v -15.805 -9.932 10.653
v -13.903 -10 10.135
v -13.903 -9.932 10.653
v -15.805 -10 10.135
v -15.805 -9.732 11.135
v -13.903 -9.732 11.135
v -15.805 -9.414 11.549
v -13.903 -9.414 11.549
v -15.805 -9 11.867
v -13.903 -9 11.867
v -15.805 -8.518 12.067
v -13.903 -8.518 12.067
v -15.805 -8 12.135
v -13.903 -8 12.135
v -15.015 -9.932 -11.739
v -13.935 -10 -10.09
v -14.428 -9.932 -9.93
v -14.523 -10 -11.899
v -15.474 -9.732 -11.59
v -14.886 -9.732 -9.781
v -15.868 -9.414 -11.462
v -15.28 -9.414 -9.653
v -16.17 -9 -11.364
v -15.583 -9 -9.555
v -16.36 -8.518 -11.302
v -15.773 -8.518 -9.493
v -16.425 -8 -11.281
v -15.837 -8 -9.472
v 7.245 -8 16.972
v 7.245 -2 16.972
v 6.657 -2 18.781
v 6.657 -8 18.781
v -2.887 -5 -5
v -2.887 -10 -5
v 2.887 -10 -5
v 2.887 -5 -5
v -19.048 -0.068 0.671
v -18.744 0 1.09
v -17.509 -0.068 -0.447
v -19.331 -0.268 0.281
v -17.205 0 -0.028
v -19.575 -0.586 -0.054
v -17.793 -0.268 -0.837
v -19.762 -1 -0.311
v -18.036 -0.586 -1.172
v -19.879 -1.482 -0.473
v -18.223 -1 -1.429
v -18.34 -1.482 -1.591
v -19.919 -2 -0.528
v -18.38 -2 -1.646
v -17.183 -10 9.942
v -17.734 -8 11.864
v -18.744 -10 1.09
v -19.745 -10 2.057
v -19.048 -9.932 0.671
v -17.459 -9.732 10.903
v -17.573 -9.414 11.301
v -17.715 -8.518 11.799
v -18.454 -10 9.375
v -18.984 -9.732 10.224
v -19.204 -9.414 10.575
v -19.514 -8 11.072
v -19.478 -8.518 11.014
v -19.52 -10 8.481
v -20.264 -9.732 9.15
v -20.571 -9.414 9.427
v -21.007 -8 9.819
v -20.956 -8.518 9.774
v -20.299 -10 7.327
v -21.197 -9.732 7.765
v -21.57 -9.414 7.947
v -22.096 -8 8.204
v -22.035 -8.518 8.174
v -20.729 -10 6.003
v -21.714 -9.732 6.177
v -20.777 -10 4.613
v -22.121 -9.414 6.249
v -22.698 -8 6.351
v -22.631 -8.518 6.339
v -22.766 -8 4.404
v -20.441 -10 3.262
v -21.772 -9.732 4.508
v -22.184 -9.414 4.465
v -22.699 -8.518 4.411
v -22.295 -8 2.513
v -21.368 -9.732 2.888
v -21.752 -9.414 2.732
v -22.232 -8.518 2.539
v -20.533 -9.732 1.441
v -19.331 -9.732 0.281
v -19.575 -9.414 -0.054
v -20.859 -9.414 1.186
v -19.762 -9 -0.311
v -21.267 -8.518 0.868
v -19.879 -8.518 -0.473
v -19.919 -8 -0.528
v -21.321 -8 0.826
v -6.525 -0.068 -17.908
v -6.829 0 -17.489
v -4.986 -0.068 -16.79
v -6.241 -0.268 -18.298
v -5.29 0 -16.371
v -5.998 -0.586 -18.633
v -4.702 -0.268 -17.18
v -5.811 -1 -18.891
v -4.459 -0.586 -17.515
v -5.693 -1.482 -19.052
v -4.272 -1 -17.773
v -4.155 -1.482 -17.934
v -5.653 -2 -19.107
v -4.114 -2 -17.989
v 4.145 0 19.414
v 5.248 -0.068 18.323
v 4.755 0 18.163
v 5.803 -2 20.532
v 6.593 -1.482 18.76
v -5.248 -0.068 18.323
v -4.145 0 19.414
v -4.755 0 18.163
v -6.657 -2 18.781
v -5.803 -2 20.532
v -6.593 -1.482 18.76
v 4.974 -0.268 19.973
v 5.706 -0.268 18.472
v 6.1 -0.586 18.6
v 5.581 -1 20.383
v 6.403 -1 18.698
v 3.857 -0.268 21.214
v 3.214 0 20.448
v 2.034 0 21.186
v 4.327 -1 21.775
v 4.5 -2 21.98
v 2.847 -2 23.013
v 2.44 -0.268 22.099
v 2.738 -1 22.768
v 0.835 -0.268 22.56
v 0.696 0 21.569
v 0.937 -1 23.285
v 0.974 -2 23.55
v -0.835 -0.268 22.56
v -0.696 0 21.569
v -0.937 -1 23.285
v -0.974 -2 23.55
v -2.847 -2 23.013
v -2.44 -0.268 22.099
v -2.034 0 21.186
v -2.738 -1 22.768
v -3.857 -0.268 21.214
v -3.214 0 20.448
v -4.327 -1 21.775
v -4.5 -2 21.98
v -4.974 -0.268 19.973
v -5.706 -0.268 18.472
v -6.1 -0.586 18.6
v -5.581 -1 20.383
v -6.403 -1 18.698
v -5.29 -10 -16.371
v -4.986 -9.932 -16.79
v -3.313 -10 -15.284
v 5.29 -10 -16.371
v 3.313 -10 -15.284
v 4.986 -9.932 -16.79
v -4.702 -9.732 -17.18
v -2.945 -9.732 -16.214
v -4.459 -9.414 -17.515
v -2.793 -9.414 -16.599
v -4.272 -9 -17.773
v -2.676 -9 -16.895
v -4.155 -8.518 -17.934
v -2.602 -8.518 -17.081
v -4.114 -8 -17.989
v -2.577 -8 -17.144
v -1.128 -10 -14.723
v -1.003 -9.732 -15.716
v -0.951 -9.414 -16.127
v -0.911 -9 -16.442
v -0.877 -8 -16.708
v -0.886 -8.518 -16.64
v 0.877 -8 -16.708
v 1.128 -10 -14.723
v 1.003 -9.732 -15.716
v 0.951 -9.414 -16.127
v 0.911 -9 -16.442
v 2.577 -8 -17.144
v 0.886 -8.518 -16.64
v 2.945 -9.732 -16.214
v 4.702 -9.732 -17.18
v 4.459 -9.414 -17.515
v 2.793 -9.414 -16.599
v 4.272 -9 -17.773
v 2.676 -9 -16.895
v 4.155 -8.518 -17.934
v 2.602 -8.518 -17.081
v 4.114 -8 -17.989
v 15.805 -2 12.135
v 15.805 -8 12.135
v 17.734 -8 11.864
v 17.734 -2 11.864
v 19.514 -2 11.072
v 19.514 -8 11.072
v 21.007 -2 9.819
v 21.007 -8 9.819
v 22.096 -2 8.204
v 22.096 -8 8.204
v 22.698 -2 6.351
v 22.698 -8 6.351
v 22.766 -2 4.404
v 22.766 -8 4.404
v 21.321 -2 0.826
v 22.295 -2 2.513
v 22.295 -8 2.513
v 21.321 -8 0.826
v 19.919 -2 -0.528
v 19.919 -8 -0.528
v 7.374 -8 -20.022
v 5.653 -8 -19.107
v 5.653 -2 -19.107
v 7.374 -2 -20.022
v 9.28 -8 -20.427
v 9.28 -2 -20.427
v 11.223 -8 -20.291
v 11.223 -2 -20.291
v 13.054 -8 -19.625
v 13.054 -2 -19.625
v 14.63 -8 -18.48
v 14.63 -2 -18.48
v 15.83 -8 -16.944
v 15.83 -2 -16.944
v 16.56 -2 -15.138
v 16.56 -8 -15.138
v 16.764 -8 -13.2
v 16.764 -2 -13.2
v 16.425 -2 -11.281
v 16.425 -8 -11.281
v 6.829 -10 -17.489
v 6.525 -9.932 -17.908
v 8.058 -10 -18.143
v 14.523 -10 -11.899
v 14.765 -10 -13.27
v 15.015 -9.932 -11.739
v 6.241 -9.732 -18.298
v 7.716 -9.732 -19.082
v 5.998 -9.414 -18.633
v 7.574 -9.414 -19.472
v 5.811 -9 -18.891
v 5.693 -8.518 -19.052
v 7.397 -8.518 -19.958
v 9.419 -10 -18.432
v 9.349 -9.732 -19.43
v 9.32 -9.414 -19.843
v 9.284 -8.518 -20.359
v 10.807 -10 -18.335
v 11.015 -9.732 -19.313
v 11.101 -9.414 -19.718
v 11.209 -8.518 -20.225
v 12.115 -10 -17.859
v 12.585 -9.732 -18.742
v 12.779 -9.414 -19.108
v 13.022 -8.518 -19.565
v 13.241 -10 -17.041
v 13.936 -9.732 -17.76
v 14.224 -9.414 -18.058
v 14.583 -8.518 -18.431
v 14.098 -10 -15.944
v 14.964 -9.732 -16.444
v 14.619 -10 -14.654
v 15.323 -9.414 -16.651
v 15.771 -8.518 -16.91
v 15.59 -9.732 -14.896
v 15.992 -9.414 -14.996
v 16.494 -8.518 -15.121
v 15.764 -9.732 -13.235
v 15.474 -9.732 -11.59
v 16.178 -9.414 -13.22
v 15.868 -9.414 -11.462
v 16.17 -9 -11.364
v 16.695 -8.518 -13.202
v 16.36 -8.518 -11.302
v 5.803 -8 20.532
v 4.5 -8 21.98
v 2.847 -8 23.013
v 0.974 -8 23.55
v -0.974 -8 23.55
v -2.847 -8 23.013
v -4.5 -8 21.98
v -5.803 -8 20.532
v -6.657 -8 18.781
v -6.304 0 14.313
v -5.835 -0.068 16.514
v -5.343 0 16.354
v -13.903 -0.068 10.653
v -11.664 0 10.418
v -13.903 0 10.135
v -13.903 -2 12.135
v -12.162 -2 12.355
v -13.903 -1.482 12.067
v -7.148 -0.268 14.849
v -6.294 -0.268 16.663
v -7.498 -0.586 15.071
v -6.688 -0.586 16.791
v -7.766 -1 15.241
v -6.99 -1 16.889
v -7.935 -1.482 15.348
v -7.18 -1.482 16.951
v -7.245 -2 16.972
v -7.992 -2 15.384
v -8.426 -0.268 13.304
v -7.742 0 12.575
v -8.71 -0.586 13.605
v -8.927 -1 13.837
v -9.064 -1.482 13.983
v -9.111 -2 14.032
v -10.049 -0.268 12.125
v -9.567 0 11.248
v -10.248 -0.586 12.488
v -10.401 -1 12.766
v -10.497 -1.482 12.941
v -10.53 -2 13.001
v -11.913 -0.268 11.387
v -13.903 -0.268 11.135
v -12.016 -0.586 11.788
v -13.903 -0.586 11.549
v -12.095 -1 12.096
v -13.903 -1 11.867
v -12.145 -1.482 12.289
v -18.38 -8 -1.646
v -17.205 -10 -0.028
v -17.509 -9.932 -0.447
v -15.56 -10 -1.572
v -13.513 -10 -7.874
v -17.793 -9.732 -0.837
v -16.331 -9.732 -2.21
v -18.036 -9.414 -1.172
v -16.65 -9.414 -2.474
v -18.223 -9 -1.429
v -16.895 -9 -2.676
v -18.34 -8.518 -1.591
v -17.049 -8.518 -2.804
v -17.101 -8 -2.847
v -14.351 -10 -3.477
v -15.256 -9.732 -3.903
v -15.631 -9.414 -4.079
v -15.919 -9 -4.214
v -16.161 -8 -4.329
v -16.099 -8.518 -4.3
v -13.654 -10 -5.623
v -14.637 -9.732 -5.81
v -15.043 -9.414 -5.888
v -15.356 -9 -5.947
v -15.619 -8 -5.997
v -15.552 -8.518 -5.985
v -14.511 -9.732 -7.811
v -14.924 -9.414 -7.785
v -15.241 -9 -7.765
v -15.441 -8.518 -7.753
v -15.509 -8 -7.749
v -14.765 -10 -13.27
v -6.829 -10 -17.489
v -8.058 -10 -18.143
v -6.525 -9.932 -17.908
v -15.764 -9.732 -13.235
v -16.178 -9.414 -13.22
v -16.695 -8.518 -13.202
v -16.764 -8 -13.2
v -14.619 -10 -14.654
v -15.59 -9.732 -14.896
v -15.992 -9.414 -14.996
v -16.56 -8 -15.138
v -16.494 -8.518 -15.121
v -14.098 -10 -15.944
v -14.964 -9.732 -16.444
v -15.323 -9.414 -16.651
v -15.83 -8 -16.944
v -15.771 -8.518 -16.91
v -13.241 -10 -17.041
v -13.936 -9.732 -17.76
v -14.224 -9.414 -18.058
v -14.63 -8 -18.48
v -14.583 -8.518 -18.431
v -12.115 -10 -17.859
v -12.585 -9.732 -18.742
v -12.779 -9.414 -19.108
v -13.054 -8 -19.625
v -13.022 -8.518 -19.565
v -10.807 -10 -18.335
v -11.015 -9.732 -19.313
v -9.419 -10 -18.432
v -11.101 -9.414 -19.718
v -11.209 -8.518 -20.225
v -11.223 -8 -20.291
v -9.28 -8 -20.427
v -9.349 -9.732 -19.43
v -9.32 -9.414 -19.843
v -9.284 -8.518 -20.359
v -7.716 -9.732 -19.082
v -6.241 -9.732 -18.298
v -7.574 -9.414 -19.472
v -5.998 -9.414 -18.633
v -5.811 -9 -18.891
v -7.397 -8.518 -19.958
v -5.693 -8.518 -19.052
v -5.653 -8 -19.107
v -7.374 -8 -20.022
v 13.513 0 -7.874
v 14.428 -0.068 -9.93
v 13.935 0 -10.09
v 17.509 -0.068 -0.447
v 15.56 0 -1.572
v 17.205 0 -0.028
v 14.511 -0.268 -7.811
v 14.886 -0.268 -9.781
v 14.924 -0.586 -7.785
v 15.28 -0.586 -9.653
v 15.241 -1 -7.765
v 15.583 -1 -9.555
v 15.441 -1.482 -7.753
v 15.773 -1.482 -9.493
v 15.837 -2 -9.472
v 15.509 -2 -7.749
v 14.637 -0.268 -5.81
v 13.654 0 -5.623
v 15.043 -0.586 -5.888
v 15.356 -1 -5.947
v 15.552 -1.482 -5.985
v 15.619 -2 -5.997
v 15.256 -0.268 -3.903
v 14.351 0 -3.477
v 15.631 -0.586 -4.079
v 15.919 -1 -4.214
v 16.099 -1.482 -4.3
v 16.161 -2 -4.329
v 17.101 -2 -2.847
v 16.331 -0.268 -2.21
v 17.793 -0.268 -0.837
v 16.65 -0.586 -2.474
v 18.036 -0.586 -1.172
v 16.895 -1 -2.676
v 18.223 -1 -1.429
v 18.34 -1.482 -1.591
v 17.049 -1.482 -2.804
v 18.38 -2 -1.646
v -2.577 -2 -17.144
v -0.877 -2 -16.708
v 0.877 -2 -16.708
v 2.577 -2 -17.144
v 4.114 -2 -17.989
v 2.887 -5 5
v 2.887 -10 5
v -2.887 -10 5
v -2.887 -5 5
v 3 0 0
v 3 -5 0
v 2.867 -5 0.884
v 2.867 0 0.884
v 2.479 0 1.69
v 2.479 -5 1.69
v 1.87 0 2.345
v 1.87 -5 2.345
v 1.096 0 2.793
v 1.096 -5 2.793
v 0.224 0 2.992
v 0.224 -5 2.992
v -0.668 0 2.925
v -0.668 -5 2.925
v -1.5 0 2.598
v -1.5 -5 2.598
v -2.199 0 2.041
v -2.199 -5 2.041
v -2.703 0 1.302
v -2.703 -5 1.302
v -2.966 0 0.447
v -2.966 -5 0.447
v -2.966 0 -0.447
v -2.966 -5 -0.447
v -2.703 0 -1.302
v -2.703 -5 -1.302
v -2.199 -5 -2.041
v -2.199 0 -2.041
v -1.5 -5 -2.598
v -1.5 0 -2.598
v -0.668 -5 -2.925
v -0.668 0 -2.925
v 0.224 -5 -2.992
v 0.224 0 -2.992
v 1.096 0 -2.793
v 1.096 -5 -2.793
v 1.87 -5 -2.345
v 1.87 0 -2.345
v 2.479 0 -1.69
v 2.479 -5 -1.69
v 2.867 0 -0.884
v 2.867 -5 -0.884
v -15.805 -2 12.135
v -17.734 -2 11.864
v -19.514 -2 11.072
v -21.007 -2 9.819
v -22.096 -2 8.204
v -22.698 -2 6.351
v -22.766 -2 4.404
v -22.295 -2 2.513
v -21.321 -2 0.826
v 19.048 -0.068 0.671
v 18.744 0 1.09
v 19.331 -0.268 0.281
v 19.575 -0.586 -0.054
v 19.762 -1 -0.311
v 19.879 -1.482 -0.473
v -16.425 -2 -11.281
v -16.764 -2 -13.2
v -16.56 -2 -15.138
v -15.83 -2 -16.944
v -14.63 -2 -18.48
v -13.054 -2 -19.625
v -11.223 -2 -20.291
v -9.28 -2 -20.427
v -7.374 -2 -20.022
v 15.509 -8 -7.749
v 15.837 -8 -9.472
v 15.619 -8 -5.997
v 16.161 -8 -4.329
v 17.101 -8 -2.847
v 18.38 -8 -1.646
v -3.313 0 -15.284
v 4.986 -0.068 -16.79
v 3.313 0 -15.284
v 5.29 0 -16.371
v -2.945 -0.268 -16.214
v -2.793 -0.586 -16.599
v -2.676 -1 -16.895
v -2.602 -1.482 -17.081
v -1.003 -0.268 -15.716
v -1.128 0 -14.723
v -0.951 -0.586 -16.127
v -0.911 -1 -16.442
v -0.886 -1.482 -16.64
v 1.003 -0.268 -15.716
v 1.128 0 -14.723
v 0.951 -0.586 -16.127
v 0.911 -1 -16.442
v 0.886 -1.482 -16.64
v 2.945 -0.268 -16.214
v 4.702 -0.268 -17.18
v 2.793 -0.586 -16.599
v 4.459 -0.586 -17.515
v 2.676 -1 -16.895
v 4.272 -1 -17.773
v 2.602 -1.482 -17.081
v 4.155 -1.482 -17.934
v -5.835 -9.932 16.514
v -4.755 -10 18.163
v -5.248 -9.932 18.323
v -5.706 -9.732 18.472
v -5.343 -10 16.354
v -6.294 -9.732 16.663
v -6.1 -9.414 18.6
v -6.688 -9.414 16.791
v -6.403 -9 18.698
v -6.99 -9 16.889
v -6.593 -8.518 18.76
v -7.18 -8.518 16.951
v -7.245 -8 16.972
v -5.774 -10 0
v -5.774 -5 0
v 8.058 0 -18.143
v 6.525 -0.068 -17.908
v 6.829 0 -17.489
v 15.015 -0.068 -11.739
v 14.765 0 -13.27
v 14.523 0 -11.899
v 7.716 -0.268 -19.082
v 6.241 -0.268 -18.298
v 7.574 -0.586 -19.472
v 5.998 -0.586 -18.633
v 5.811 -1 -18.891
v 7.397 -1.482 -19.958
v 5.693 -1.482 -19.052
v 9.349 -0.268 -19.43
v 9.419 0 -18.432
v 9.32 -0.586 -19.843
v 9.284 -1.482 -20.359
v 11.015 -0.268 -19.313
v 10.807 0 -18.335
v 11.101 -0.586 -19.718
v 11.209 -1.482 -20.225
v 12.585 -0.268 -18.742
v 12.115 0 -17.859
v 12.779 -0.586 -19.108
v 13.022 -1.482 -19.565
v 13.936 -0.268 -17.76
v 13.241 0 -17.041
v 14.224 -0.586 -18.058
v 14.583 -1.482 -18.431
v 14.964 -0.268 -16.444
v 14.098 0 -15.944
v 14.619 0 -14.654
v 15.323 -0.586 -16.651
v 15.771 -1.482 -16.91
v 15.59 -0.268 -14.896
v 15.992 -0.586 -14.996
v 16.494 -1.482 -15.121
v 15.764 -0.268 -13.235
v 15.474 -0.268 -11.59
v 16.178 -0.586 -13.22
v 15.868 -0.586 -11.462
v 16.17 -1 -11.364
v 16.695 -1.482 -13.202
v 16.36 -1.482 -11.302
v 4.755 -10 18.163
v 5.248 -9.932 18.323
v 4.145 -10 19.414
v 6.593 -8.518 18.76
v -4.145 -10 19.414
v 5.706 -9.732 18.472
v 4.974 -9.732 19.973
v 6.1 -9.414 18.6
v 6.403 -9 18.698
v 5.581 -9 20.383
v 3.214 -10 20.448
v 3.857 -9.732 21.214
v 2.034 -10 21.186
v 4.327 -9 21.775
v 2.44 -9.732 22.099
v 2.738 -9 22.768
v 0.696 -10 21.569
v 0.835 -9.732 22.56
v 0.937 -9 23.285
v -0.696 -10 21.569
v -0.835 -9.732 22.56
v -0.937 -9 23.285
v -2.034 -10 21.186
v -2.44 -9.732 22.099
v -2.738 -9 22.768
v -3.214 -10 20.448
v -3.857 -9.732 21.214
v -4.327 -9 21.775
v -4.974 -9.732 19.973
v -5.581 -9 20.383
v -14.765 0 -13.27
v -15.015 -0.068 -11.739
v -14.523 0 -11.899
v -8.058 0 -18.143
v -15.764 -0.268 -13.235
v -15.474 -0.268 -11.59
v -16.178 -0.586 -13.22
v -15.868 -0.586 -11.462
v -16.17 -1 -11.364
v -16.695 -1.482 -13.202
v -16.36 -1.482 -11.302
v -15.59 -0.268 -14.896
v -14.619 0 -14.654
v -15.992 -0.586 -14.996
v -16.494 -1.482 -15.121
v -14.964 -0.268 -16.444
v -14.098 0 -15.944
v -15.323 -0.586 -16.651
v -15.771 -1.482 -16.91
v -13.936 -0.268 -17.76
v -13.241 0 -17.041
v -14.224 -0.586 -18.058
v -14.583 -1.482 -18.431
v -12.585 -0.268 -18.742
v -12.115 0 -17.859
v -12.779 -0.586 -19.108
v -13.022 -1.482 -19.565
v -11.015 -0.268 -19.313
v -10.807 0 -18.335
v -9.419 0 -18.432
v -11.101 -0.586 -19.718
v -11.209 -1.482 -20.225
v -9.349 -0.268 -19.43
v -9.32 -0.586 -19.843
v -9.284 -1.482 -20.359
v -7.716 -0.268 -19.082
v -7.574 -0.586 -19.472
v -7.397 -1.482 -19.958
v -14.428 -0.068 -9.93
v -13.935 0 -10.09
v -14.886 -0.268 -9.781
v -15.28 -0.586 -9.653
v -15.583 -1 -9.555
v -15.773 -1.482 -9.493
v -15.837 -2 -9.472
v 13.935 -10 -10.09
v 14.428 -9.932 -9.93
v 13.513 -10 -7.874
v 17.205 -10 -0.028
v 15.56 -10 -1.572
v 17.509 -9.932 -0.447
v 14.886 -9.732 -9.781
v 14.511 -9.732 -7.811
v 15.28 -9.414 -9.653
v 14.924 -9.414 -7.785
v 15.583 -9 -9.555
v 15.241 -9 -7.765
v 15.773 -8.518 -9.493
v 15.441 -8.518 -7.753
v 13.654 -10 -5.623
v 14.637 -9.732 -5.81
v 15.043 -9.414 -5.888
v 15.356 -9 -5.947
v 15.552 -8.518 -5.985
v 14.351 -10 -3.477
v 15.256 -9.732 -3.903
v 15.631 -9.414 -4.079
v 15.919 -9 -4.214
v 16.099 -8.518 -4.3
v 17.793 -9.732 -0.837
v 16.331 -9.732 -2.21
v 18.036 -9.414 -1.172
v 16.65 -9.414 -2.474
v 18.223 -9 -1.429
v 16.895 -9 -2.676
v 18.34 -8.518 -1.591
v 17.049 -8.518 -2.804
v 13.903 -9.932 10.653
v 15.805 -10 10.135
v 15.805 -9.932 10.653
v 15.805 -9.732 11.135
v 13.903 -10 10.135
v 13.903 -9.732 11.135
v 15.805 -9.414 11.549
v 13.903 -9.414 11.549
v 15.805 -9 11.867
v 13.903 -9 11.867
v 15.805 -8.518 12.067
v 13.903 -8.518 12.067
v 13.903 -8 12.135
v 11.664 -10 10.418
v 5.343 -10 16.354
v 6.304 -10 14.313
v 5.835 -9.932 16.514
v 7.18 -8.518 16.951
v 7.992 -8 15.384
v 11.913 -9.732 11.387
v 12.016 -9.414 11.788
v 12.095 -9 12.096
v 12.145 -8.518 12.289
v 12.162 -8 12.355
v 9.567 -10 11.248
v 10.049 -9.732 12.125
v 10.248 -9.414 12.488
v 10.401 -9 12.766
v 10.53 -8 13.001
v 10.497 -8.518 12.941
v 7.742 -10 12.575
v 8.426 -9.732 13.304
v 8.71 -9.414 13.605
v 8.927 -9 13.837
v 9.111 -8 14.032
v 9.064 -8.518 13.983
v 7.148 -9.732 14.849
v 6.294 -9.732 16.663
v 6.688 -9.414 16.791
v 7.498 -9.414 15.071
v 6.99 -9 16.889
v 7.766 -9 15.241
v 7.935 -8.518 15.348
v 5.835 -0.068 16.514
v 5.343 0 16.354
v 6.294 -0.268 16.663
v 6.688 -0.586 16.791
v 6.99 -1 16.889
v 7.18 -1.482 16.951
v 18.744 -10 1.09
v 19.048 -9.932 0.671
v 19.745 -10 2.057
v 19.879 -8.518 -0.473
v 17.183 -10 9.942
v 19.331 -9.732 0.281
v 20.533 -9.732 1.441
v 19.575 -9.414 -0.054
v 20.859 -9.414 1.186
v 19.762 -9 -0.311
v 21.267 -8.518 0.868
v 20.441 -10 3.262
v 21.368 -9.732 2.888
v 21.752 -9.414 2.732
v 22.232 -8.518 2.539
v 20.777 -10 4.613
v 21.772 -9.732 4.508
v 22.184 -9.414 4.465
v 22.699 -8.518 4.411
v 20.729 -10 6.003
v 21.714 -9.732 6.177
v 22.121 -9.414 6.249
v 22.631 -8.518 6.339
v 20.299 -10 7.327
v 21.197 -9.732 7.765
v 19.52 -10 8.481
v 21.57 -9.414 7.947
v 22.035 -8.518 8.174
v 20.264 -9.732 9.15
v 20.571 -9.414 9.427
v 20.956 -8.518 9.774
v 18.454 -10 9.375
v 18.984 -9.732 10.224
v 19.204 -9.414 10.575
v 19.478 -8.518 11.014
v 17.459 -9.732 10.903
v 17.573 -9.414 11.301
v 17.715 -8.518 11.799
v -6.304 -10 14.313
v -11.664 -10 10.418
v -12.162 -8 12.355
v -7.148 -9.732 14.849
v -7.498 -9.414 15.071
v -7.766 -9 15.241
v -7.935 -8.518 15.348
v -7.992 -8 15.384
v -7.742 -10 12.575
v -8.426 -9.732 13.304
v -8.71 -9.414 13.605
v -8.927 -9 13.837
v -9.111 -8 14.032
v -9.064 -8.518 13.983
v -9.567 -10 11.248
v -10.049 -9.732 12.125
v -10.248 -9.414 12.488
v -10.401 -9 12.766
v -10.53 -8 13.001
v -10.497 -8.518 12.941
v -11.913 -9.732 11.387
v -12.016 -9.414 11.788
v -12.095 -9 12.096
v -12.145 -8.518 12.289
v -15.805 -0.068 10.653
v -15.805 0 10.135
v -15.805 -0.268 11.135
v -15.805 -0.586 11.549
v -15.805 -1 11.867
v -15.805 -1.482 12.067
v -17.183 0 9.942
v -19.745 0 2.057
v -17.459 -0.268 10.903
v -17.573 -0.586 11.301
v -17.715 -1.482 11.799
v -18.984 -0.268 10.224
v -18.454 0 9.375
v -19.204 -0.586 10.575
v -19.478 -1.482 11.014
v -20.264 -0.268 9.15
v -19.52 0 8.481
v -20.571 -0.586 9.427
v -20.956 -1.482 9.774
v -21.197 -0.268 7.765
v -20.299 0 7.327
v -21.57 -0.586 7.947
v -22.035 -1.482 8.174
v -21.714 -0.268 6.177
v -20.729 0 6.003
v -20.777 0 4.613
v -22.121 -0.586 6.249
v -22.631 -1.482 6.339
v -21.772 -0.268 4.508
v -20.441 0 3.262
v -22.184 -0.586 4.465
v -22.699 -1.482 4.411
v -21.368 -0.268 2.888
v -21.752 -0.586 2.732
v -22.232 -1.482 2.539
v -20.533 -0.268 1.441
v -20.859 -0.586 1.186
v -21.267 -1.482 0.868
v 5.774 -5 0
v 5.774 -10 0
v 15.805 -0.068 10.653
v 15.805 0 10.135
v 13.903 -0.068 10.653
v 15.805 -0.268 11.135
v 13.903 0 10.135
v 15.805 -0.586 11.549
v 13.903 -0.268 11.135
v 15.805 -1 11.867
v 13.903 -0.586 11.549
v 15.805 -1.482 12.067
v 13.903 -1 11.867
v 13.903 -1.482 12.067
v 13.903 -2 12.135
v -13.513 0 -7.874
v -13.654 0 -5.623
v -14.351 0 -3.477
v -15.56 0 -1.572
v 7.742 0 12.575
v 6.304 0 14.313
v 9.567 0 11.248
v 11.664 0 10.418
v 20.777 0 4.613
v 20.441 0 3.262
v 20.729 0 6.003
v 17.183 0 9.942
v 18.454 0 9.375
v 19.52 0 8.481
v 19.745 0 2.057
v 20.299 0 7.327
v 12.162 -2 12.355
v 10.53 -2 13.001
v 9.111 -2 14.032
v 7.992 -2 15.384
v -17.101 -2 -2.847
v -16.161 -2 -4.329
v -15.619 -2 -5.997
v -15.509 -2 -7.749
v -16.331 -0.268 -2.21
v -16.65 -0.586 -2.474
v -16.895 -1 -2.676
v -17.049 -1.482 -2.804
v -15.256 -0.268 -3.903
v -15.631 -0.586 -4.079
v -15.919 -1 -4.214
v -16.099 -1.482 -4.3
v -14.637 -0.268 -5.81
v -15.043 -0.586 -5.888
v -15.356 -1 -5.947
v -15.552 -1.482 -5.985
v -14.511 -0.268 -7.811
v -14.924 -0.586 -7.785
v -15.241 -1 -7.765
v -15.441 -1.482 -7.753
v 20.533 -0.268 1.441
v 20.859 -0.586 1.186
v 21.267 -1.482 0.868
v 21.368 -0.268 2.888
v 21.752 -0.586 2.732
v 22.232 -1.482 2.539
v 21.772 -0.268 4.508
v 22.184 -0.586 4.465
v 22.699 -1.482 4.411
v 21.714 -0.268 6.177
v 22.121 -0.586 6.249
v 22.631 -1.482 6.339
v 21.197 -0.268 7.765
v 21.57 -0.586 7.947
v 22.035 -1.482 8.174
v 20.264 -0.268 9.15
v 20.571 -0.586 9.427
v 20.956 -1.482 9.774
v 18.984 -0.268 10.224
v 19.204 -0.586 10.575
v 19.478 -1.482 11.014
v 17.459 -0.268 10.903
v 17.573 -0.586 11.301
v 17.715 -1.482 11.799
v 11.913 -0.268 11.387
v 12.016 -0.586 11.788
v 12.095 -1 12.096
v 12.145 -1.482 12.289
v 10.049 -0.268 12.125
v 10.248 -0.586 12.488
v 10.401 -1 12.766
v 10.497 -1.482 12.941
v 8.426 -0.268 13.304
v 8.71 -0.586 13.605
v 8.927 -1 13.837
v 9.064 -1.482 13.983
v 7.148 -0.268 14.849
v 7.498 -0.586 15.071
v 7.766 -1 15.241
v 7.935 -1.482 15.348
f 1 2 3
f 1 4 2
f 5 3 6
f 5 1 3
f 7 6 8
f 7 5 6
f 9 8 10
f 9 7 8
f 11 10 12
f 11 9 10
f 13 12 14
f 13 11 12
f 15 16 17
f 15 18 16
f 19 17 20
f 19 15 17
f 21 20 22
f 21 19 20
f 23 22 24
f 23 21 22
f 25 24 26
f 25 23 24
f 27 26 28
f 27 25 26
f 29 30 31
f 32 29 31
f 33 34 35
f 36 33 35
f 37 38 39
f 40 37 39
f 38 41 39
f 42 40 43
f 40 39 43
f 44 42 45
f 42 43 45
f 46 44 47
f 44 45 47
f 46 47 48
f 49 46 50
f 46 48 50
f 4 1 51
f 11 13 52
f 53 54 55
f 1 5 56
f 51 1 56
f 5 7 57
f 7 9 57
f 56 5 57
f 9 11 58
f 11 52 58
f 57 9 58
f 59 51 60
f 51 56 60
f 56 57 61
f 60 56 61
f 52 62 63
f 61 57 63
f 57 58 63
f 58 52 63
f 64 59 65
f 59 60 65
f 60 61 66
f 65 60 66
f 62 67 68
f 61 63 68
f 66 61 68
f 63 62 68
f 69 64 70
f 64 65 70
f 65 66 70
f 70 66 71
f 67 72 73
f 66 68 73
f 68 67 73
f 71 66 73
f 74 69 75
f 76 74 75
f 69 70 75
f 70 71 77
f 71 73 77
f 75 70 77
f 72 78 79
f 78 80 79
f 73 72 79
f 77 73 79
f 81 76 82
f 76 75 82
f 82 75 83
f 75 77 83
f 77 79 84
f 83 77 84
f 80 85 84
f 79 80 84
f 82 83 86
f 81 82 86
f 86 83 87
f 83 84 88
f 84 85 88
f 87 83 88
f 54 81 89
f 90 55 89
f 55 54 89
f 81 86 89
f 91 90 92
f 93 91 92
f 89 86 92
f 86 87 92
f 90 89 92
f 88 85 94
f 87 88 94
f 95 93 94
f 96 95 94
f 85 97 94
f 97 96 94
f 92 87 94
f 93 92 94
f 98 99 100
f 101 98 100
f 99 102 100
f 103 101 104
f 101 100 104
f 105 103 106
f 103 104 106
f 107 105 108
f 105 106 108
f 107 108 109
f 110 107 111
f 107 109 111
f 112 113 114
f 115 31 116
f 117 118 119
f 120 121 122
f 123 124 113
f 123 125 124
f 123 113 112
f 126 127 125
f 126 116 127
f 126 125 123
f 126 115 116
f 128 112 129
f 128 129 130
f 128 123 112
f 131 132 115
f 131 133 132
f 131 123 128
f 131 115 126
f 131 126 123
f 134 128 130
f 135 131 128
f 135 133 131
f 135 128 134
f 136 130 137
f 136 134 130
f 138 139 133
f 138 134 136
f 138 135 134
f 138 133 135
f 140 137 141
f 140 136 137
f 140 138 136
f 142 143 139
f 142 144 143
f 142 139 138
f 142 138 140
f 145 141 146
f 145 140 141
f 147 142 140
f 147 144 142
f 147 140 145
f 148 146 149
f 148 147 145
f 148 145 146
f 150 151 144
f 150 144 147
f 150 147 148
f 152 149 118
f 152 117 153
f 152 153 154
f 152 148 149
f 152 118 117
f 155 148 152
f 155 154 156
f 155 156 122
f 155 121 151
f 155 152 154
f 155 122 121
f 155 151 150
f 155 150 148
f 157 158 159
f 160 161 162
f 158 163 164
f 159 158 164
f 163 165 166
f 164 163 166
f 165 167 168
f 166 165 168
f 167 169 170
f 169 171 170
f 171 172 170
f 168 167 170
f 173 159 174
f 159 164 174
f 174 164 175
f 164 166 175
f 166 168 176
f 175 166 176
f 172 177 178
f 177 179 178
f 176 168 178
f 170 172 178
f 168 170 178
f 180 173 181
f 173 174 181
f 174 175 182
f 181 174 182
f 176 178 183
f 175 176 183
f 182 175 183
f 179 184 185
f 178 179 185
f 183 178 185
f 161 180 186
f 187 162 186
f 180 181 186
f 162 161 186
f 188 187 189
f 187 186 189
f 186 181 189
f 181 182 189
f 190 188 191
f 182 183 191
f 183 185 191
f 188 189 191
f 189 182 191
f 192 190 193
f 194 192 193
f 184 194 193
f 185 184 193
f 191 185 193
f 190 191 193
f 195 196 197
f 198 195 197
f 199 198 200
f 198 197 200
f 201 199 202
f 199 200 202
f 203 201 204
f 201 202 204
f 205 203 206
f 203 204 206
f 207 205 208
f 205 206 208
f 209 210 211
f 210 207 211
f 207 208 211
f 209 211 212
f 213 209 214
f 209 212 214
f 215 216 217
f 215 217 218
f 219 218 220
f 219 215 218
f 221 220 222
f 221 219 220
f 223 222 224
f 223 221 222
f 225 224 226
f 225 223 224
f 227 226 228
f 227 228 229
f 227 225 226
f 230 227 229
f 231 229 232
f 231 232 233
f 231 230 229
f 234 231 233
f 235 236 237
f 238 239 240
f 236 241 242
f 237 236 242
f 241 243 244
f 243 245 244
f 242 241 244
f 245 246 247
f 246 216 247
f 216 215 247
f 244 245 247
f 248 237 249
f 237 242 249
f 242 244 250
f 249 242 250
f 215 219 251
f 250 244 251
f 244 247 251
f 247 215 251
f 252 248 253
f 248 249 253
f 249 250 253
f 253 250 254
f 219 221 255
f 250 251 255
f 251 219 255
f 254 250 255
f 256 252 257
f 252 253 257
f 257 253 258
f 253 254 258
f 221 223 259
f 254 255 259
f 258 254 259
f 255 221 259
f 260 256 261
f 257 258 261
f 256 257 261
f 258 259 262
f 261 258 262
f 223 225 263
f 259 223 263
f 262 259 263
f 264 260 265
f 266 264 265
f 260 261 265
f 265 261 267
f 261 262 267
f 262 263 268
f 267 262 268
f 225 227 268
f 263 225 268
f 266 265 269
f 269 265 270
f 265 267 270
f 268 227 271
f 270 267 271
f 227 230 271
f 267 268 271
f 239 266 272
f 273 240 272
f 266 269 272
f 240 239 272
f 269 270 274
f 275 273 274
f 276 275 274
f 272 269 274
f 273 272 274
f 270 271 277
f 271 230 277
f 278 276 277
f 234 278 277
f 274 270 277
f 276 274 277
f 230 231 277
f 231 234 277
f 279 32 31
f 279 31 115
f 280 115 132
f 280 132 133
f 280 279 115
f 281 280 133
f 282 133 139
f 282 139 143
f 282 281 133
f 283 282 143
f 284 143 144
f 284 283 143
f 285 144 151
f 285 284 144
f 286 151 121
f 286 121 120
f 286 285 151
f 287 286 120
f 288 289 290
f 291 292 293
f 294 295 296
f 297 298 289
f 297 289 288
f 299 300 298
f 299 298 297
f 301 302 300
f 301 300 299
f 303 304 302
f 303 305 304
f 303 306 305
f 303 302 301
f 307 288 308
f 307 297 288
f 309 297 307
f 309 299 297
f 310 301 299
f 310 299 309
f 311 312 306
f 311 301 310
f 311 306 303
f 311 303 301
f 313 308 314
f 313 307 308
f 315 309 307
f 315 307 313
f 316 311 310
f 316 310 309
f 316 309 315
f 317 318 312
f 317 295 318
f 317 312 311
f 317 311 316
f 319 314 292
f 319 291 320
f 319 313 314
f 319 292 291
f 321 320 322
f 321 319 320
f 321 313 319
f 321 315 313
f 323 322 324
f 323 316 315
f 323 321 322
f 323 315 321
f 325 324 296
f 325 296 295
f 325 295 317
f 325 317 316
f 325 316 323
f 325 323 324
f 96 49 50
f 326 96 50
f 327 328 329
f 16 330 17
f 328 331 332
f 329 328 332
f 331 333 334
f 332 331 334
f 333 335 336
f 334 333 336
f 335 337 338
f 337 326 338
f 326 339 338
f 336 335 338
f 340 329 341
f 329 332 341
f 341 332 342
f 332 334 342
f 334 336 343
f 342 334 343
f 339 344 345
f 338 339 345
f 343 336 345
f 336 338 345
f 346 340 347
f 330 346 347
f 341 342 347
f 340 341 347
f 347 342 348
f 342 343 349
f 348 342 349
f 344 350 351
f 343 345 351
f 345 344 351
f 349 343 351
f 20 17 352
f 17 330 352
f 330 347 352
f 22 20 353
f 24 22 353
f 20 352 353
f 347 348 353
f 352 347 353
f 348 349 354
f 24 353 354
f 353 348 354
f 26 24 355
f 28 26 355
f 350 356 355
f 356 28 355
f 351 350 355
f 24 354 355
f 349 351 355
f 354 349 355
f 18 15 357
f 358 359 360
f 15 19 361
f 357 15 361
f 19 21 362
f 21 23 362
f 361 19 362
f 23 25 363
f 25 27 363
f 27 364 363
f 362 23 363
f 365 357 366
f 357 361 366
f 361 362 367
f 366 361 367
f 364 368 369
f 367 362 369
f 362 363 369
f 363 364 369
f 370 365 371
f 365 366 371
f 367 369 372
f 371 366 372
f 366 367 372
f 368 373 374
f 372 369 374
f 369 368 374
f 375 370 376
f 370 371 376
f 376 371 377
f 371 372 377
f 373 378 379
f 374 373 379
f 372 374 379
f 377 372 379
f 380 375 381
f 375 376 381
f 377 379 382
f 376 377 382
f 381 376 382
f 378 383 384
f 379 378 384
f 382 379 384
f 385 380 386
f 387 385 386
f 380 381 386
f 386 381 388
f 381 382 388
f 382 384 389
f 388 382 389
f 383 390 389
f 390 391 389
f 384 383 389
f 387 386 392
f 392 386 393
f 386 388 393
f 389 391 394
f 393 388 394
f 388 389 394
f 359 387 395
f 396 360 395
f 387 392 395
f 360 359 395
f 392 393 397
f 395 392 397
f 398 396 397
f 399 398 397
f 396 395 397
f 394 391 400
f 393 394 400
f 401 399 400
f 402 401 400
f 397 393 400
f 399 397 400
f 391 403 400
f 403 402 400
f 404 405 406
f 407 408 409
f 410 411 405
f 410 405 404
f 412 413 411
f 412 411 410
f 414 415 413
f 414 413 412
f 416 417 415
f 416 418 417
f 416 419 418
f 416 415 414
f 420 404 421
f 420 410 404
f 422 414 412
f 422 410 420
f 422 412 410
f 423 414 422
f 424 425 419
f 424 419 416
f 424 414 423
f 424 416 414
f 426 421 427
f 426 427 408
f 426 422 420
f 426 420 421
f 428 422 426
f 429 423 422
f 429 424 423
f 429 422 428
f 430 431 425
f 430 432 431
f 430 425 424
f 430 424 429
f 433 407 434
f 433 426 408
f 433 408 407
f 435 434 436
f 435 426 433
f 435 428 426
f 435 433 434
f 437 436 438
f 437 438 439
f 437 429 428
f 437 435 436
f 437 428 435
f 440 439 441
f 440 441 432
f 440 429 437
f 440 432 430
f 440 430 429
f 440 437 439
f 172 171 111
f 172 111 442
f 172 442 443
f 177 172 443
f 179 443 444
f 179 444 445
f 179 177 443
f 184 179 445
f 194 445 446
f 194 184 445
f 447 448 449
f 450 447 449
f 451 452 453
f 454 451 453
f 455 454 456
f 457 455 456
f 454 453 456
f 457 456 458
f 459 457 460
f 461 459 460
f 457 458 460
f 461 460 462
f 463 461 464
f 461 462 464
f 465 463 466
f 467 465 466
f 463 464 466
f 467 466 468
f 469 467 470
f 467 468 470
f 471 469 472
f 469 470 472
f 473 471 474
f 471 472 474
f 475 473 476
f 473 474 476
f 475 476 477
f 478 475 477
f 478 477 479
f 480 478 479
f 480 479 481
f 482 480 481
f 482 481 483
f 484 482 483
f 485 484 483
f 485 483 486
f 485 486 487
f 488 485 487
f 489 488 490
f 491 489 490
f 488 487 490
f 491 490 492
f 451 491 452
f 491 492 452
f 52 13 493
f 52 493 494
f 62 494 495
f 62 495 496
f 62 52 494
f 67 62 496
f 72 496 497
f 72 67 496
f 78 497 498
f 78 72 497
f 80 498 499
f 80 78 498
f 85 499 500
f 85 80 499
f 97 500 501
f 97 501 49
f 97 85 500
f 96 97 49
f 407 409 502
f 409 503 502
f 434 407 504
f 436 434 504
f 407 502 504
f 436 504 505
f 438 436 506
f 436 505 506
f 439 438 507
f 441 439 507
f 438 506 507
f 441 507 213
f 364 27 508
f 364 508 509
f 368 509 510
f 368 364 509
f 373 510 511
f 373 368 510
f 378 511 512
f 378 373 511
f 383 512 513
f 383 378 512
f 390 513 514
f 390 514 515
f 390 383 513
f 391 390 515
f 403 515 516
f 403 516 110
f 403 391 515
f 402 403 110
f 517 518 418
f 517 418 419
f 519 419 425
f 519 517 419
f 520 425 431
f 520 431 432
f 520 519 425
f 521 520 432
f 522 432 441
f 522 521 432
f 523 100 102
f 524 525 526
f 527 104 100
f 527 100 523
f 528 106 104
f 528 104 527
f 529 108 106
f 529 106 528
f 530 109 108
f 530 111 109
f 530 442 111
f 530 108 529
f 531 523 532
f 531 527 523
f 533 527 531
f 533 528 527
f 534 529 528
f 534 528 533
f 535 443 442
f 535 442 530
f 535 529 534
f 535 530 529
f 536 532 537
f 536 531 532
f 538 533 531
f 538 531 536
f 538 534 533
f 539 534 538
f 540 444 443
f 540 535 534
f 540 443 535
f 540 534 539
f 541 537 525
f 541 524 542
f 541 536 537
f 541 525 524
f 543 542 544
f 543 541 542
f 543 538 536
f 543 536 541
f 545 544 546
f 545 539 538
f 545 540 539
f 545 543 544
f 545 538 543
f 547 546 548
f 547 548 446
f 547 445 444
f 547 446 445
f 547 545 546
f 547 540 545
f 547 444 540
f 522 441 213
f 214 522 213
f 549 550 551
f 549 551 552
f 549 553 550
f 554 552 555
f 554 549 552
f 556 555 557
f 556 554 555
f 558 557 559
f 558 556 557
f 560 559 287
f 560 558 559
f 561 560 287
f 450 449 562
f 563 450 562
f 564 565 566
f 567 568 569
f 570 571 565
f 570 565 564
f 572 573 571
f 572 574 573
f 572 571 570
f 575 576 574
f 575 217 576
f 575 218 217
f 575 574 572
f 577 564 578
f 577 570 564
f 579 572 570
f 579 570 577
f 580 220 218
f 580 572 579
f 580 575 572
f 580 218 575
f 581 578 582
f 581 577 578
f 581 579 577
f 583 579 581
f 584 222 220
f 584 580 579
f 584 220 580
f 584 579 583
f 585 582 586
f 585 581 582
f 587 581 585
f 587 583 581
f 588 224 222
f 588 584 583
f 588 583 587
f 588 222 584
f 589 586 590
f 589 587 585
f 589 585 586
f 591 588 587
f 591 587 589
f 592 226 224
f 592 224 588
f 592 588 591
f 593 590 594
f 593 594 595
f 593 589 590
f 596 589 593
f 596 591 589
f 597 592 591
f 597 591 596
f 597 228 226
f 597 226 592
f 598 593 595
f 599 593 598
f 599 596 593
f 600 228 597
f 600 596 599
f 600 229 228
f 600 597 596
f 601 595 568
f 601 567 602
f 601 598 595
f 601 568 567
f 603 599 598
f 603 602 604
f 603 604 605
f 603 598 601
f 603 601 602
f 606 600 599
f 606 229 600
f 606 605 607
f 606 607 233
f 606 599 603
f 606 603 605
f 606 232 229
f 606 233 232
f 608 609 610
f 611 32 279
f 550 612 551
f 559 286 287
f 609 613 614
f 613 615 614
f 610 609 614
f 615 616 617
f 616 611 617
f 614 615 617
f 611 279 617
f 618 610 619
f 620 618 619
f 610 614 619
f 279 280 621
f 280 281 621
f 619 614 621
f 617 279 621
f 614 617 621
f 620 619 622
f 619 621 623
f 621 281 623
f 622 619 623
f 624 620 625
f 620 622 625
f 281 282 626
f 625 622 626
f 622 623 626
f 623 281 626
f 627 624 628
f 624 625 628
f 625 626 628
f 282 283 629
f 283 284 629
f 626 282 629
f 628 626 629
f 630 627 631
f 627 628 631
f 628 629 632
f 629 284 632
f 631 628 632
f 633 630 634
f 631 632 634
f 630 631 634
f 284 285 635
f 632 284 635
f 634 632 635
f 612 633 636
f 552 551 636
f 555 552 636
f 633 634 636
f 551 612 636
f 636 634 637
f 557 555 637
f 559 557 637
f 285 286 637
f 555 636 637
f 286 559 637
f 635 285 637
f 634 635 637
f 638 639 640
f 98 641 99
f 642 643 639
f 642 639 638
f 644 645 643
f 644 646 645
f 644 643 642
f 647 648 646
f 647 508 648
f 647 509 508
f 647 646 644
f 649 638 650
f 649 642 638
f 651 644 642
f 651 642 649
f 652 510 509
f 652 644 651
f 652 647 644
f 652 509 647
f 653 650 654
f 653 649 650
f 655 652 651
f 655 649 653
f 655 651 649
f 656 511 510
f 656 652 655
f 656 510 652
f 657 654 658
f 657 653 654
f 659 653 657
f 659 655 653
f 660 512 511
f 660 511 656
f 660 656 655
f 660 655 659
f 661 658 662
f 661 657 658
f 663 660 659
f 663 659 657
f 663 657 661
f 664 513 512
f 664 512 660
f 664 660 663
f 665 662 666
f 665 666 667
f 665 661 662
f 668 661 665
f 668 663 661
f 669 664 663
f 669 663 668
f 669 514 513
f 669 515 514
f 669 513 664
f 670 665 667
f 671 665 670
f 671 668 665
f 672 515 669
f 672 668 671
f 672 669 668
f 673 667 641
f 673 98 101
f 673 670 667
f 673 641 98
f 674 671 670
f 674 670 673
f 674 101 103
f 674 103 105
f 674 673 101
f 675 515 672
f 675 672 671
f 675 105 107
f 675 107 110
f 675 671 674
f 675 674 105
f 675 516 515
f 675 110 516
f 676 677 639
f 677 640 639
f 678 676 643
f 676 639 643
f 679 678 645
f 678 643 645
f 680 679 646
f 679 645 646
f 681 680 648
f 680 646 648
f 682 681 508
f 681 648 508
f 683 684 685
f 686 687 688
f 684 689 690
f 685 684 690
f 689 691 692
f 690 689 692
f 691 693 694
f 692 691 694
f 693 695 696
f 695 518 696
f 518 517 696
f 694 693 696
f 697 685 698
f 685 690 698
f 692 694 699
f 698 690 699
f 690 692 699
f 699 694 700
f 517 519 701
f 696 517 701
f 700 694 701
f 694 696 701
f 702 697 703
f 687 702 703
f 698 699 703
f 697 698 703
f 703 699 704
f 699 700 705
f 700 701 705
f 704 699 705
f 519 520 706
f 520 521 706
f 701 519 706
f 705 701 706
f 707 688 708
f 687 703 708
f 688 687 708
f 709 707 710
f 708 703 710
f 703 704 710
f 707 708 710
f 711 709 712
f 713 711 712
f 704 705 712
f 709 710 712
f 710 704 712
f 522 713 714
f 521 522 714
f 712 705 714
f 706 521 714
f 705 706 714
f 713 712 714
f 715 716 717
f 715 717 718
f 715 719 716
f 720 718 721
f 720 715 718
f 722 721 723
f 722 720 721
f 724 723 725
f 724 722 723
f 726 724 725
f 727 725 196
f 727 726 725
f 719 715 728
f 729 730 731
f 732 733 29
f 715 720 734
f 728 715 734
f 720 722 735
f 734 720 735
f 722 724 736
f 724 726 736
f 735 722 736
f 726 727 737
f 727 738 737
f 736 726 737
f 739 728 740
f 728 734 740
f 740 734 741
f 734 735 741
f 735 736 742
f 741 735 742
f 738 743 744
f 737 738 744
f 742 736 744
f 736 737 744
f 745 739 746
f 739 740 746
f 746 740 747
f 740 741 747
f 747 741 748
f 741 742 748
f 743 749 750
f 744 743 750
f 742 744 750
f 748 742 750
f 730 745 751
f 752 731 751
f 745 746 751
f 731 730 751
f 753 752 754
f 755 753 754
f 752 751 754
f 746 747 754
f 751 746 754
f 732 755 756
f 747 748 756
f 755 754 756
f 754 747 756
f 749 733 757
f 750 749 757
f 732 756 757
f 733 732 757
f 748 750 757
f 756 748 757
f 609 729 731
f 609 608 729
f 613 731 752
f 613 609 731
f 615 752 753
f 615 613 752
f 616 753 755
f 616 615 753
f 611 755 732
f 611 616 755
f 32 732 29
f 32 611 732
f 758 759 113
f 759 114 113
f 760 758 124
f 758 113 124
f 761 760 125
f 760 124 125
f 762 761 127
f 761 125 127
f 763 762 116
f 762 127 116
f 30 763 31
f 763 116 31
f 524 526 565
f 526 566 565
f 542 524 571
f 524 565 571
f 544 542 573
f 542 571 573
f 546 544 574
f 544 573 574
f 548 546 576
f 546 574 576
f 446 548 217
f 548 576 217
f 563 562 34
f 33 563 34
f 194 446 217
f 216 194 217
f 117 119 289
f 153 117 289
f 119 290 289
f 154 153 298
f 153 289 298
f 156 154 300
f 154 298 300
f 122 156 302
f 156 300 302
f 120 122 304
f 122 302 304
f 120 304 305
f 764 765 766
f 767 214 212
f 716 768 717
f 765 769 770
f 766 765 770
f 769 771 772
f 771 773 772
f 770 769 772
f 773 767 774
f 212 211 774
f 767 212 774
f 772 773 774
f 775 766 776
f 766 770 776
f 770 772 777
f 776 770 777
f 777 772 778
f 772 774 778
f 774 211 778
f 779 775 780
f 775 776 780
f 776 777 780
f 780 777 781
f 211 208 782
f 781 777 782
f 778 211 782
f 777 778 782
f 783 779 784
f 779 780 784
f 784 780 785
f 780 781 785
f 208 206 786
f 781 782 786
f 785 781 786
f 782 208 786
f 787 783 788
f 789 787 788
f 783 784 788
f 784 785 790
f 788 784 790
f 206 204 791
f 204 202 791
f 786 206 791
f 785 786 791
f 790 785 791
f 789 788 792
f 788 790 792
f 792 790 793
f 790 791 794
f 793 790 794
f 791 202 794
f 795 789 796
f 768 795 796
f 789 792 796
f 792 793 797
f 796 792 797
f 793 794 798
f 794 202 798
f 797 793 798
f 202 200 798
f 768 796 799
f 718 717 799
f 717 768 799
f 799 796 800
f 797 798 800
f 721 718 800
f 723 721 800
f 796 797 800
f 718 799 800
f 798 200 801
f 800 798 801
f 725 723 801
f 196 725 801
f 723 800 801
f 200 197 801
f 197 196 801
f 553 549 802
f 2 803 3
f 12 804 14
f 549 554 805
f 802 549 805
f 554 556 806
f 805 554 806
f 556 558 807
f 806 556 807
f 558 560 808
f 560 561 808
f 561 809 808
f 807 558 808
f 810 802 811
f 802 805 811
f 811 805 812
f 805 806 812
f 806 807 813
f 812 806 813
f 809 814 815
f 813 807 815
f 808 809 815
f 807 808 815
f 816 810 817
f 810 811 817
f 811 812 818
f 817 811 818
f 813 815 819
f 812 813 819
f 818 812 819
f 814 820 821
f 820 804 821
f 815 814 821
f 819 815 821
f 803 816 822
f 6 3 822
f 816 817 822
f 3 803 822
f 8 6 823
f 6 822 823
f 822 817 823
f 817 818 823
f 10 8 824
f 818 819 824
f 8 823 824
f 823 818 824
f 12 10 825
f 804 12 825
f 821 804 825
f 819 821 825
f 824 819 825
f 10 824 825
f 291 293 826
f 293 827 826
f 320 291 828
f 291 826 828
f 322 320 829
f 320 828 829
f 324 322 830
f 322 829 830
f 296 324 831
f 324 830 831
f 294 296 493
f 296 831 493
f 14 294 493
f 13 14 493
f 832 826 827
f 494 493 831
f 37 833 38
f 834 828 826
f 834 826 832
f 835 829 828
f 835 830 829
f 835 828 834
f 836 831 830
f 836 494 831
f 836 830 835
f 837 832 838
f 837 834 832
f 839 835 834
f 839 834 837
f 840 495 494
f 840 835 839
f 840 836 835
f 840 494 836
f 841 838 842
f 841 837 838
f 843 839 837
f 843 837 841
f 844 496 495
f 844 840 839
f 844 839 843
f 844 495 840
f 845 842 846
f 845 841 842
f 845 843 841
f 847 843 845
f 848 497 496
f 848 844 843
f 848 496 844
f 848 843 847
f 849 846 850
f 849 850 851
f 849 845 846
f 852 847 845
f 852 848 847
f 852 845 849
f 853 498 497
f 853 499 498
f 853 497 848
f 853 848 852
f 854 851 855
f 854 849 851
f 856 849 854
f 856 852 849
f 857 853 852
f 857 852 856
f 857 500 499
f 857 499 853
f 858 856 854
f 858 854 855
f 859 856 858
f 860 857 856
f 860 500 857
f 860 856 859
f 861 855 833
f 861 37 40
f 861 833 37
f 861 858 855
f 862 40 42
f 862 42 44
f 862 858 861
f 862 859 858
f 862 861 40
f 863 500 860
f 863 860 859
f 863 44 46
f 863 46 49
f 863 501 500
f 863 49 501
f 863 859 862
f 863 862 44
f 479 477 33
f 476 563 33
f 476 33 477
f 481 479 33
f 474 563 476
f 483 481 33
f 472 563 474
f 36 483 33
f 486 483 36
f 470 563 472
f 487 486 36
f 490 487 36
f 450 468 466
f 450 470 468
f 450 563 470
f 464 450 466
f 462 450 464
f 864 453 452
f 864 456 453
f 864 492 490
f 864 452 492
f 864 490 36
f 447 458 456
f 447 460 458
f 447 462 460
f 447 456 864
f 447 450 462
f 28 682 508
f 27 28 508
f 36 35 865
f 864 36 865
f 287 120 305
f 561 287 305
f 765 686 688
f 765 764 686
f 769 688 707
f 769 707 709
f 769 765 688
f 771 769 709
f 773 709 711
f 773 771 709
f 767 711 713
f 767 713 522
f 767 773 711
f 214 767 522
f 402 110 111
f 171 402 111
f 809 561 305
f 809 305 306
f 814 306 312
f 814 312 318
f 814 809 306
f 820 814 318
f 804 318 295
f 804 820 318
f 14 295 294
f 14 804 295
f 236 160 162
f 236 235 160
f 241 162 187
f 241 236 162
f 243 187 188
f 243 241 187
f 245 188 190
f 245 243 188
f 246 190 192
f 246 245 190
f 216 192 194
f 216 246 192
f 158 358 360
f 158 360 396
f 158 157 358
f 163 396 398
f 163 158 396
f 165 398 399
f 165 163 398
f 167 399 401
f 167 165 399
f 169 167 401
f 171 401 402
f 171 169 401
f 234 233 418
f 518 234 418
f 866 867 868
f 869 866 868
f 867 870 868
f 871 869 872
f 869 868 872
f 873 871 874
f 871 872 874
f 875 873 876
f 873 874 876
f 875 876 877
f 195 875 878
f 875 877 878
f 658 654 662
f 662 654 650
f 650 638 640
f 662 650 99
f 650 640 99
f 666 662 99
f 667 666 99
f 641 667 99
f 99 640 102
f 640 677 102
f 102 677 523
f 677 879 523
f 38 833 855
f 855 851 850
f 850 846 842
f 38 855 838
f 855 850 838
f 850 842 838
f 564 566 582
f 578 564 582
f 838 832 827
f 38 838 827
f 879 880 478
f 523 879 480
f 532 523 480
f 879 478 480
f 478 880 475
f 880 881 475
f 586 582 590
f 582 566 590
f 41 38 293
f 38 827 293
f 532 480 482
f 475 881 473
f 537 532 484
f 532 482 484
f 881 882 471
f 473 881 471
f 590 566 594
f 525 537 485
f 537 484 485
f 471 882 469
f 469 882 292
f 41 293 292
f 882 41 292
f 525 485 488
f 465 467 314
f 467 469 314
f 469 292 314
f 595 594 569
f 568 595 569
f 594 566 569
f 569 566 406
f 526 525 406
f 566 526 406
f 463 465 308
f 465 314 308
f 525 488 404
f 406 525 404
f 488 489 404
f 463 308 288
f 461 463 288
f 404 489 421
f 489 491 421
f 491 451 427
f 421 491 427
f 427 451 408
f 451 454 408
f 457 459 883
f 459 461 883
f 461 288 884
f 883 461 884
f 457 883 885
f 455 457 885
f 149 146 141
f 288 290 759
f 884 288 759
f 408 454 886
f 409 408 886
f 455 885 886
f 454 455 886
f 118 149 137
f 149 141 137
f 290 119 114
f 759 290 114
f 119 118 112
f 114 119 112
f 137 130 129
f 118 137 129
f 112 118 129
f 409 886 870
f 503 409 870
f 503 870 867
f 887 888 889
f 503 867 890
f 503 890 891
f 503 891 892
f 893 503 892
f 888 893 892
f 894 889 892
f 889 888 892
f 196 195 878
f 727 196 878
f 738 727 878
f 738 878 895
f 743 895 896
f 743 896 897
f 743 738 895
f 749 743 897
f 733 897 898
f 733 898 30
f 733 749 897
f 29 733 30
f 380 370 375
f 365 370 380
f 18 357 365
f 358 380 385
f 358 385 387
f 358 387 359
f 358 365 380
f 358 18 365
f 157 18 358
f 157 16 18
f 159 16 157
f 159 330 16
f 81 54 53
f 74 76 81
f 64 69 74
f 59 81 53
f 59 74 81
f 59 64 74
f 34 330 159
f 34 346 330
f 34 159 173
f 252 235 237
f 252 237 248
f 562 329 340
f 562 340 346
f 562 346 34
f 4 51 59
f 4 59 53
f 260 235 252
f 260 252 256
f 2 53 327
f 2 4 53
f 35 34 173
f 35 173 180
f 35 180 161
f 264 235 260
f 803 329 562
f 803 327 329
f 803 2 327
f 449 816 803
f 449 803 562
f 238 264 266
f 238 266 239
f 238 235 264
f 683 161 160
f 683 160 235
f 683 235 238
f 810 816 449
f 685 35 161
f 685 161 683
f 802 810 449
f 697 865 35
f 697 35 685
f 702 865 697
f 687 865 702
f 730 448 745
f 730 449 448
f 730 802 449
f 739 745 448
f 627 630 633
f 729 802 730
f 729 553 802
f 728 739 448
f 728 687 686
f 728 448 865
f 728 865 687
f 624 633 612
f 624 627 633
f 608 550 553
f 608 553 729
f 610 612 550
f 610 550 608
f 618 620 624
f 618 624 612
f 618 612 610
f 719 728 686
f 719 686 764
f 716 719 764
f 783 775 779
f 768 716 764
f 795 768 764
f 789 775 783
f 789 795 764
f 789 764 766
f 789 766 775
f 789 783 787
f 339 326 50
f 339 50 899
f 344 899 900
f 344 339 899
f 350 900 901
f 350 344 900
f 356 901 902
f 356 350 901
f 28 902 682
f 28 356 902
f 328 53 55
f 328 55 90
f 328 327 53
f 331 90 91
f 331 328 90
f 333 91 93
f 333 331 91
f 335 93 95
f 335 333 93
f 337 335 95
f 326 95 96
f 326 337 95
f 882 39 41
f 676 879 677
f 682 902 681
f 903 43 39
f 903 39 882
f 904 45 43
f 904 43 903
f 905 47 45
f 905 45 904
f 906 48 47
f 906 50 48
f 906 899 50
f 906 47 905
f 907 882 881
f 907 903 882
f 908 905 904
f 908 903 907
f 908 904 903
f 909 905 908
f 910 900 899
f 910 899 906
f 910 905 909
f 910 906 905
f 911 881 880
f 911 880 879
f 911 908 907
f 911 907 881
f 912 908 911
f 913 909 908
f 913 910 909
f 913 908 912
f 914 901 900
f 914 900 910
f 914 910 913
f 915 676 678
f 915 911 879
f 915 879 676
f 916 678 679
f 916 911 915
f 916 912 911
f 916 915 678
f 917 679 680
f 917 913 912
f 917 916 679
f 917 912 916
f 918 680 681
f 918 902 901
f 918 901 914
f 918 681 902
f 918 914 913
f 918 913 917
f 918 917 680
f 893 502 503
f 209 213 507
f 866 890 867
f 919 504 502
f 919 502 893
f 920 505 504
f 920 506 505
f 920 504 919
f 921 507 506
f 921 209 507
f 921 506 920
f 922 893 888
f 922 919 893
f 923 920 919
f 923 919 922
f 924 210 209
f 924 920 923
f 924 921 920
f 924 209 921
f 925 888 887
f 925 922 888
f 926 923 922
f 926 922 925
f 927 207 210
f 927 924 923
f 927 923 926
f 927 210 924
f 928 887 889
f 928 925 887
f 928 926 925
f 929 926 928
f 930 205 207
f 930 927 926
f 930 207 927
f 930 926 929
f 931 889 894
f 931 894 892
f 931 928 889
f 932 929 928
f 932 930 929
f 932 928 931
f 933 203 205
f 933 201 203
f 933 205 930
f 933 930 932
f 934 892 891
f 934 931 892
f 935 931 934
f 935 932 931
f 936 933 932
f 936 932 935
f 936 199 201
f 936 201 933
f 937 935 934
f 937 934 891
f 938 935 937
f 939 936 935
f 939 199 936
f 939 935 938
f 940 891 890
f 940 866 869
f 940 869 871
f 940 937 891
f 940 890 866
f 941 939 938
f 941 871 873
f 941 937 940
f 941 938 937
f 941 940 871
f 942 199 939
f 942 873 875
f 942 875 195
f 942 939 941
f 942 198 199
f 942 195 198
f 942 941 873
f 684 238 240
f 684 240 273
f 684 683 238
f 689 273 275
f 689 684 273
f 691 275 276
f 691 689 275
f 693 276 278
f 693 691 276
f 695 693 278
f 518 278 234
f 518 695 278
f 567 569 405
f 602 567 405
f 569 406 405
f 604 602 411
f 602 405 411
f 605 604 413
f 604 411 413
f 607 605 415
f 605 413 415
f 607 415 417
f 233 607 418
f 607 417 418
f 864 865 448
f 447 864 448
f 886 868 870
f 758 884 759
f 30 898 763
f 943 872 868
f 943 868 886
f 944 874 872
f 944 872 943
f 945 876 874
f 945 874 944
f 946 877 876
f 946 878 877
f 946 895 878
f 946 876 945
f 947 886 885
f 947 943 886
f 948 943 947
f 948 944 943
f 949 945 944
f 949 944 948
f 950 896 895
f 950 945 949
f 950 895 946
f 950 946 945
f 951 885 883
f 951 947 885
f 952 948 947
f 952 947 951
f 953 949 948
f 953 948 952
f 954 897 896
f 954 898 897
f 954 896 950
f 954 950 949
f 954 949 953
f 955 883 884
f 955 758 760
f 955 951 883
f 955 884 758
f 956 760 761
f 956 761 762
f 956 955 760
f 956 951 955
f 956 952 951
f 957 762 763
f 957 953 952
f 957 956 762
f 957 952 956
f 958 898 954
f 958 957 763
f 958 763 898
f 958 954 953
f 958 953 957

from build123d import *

# Parameters (mm, degrees)
F1_DEPTH = 10
F2_R     = 7
F4_DEPTH = 5
F5_R     = 3
F6_DEPTH = 5
F7_R     = 2


with BuildPart() as f1:
    # F0 (on Front) → F1 (new body)
    with BuildSketch(Plane.XZ):
        with BuildLine():
            Line((37.3484742732, 12.1352549156), (8.8167787844, 12.1352549156))
            ThreePointArc((8.8167787844, 12.1352549156), (13.3650978628, 6.8098574961), (15, 0))
            ThreePointArc((15, 0), (14.8153251089, -2.3465169756), (14.2658477444, -4.6352549156))
            Line((14.2658477444, -4.6352549156), (37.3484742732, 12.1352549156))
        make_face()
        with BuildLine():
            Line((8.8167787844, 12.1352549156), (0, 39.2705098312))
            Line((0, 39.2705098312), (-8.8167787844, 12.1352549156))
            ThreePointArc((-8.8167787844, 12.1352549156), (0, 15), (8.8167787844, 12.1352549156))
        make_face()
        with BuildLine():
            ThreePointArc((-14.2658477444, -4.6352549156), (-14.2658477444, 4.6352549156), (-8.8167787844, 12.1352549156))
            Line((-8.8167787844, 12.1352549156), (-37.3484742732, 12.1352549156))
            Line((-37.3484742732, 12.1352549156), (-14.2658477444, -4.6352549156))
        make_face()
        with BuildLine():
            ThreePointArc((8.8167787844, 12.1352549156), (0, 15), (-8.8167787844, 12.1352549156))
            ThreePointArc((-8.8167787844, 12.1352549156), (-14.2658477444, 4.6352549156), (-14.2658477444, -4.6352549156))
            ThreePointArc((-14.2658477444, -4.6352549156), (-8.8167787844, -12.1352549156), (0, -15))
            ThreePointArc((0, -15), (8.8167787844, -12.1352549156), (14.2658477444, -4.6352549156))
            ThreePointArc((14.2658477444, -4.6352549156), (14.8153251089, -2.3465169756), (15, 0))
            ThreePointArc((15, 0), (13.3650978628, 6.8098574961), (8.8167787844, 12.1352549156))
        make_face()
        with BuildLine():
            ThreePointArc((0, -15), (-8.8167787844, -12.1352549156), (-14.2658477444, -4.6352549156))
            Line((-14.2658477444, -4.6352549156), (-23.0826265288, -31.7705098312))
            Line((-23.0826265288, -31.7705098312), (0, -15))
        make_face()
        with BuildLine():
            ThreePointArc((14.2658477444, -4.6352549156), (8.8167787844, -12.1352549156), (0, -15))
            Line((0, -15), (23.0826265288, -31.7705098312))
            Line((23.0826265288, -31.7705098312), (14.2658477444, -4.6352549156))
        make_face()
    extrude(amount=F1_DEPTH)

    # F2
    f2_edges = [f1.edges().sort_by_distance(p)[0] for p in [
        (0, -5, 39.27051),
        (37.348474, -5, 12.135255),
        (23.082627, -5, -31.77051),
        (-37.348474, -5, 12.135255),
        (-23.082627, -5, -31.77051),
        (-14.265848, -5, -4.635255),
        (0, -5, -15),
        (14.265848, -5, -4.635255),
        (8.816779, -5, 12.135255),
        (-8.816779, -5, 12.135255),
    ]]
    fillet(f2_edges, radius=F2_R)

    # F3 (on face) → F4 (cut)
    with BuildSketch(Plane.XZ.offset(10)):
        Polygon((2.8867513459, 5), (-2.8867513459, 5), (-5.7735026919, 0), (-2.8867513459, -5), (2.8867513459, -5), (5.7735026919, 0), align=None)
    extrude(amount=-F4_DEPTH, mode=Mode.SUBTRACT)

    # F5 (on face) → F6 (cut, through all)
    with BuildSketch(Plane.XZ.offset(5)):
        Circle(F5_R)
    extrude(amount=-F6_DEPTH, mode=Mode.SUBTRACT)

    # F7
    f7_edges = [f1.edges().sort_by_distance(p)[0] for p in [
        (0, -10, 23.618034),
        (9.78808, -10, 13.472136),
        (0, 0, 23.618034),
        (6.951288, 0, 17.876644),
    ]]
    fillet(f7_edges, radius=F7_R)


solid = f1.part
